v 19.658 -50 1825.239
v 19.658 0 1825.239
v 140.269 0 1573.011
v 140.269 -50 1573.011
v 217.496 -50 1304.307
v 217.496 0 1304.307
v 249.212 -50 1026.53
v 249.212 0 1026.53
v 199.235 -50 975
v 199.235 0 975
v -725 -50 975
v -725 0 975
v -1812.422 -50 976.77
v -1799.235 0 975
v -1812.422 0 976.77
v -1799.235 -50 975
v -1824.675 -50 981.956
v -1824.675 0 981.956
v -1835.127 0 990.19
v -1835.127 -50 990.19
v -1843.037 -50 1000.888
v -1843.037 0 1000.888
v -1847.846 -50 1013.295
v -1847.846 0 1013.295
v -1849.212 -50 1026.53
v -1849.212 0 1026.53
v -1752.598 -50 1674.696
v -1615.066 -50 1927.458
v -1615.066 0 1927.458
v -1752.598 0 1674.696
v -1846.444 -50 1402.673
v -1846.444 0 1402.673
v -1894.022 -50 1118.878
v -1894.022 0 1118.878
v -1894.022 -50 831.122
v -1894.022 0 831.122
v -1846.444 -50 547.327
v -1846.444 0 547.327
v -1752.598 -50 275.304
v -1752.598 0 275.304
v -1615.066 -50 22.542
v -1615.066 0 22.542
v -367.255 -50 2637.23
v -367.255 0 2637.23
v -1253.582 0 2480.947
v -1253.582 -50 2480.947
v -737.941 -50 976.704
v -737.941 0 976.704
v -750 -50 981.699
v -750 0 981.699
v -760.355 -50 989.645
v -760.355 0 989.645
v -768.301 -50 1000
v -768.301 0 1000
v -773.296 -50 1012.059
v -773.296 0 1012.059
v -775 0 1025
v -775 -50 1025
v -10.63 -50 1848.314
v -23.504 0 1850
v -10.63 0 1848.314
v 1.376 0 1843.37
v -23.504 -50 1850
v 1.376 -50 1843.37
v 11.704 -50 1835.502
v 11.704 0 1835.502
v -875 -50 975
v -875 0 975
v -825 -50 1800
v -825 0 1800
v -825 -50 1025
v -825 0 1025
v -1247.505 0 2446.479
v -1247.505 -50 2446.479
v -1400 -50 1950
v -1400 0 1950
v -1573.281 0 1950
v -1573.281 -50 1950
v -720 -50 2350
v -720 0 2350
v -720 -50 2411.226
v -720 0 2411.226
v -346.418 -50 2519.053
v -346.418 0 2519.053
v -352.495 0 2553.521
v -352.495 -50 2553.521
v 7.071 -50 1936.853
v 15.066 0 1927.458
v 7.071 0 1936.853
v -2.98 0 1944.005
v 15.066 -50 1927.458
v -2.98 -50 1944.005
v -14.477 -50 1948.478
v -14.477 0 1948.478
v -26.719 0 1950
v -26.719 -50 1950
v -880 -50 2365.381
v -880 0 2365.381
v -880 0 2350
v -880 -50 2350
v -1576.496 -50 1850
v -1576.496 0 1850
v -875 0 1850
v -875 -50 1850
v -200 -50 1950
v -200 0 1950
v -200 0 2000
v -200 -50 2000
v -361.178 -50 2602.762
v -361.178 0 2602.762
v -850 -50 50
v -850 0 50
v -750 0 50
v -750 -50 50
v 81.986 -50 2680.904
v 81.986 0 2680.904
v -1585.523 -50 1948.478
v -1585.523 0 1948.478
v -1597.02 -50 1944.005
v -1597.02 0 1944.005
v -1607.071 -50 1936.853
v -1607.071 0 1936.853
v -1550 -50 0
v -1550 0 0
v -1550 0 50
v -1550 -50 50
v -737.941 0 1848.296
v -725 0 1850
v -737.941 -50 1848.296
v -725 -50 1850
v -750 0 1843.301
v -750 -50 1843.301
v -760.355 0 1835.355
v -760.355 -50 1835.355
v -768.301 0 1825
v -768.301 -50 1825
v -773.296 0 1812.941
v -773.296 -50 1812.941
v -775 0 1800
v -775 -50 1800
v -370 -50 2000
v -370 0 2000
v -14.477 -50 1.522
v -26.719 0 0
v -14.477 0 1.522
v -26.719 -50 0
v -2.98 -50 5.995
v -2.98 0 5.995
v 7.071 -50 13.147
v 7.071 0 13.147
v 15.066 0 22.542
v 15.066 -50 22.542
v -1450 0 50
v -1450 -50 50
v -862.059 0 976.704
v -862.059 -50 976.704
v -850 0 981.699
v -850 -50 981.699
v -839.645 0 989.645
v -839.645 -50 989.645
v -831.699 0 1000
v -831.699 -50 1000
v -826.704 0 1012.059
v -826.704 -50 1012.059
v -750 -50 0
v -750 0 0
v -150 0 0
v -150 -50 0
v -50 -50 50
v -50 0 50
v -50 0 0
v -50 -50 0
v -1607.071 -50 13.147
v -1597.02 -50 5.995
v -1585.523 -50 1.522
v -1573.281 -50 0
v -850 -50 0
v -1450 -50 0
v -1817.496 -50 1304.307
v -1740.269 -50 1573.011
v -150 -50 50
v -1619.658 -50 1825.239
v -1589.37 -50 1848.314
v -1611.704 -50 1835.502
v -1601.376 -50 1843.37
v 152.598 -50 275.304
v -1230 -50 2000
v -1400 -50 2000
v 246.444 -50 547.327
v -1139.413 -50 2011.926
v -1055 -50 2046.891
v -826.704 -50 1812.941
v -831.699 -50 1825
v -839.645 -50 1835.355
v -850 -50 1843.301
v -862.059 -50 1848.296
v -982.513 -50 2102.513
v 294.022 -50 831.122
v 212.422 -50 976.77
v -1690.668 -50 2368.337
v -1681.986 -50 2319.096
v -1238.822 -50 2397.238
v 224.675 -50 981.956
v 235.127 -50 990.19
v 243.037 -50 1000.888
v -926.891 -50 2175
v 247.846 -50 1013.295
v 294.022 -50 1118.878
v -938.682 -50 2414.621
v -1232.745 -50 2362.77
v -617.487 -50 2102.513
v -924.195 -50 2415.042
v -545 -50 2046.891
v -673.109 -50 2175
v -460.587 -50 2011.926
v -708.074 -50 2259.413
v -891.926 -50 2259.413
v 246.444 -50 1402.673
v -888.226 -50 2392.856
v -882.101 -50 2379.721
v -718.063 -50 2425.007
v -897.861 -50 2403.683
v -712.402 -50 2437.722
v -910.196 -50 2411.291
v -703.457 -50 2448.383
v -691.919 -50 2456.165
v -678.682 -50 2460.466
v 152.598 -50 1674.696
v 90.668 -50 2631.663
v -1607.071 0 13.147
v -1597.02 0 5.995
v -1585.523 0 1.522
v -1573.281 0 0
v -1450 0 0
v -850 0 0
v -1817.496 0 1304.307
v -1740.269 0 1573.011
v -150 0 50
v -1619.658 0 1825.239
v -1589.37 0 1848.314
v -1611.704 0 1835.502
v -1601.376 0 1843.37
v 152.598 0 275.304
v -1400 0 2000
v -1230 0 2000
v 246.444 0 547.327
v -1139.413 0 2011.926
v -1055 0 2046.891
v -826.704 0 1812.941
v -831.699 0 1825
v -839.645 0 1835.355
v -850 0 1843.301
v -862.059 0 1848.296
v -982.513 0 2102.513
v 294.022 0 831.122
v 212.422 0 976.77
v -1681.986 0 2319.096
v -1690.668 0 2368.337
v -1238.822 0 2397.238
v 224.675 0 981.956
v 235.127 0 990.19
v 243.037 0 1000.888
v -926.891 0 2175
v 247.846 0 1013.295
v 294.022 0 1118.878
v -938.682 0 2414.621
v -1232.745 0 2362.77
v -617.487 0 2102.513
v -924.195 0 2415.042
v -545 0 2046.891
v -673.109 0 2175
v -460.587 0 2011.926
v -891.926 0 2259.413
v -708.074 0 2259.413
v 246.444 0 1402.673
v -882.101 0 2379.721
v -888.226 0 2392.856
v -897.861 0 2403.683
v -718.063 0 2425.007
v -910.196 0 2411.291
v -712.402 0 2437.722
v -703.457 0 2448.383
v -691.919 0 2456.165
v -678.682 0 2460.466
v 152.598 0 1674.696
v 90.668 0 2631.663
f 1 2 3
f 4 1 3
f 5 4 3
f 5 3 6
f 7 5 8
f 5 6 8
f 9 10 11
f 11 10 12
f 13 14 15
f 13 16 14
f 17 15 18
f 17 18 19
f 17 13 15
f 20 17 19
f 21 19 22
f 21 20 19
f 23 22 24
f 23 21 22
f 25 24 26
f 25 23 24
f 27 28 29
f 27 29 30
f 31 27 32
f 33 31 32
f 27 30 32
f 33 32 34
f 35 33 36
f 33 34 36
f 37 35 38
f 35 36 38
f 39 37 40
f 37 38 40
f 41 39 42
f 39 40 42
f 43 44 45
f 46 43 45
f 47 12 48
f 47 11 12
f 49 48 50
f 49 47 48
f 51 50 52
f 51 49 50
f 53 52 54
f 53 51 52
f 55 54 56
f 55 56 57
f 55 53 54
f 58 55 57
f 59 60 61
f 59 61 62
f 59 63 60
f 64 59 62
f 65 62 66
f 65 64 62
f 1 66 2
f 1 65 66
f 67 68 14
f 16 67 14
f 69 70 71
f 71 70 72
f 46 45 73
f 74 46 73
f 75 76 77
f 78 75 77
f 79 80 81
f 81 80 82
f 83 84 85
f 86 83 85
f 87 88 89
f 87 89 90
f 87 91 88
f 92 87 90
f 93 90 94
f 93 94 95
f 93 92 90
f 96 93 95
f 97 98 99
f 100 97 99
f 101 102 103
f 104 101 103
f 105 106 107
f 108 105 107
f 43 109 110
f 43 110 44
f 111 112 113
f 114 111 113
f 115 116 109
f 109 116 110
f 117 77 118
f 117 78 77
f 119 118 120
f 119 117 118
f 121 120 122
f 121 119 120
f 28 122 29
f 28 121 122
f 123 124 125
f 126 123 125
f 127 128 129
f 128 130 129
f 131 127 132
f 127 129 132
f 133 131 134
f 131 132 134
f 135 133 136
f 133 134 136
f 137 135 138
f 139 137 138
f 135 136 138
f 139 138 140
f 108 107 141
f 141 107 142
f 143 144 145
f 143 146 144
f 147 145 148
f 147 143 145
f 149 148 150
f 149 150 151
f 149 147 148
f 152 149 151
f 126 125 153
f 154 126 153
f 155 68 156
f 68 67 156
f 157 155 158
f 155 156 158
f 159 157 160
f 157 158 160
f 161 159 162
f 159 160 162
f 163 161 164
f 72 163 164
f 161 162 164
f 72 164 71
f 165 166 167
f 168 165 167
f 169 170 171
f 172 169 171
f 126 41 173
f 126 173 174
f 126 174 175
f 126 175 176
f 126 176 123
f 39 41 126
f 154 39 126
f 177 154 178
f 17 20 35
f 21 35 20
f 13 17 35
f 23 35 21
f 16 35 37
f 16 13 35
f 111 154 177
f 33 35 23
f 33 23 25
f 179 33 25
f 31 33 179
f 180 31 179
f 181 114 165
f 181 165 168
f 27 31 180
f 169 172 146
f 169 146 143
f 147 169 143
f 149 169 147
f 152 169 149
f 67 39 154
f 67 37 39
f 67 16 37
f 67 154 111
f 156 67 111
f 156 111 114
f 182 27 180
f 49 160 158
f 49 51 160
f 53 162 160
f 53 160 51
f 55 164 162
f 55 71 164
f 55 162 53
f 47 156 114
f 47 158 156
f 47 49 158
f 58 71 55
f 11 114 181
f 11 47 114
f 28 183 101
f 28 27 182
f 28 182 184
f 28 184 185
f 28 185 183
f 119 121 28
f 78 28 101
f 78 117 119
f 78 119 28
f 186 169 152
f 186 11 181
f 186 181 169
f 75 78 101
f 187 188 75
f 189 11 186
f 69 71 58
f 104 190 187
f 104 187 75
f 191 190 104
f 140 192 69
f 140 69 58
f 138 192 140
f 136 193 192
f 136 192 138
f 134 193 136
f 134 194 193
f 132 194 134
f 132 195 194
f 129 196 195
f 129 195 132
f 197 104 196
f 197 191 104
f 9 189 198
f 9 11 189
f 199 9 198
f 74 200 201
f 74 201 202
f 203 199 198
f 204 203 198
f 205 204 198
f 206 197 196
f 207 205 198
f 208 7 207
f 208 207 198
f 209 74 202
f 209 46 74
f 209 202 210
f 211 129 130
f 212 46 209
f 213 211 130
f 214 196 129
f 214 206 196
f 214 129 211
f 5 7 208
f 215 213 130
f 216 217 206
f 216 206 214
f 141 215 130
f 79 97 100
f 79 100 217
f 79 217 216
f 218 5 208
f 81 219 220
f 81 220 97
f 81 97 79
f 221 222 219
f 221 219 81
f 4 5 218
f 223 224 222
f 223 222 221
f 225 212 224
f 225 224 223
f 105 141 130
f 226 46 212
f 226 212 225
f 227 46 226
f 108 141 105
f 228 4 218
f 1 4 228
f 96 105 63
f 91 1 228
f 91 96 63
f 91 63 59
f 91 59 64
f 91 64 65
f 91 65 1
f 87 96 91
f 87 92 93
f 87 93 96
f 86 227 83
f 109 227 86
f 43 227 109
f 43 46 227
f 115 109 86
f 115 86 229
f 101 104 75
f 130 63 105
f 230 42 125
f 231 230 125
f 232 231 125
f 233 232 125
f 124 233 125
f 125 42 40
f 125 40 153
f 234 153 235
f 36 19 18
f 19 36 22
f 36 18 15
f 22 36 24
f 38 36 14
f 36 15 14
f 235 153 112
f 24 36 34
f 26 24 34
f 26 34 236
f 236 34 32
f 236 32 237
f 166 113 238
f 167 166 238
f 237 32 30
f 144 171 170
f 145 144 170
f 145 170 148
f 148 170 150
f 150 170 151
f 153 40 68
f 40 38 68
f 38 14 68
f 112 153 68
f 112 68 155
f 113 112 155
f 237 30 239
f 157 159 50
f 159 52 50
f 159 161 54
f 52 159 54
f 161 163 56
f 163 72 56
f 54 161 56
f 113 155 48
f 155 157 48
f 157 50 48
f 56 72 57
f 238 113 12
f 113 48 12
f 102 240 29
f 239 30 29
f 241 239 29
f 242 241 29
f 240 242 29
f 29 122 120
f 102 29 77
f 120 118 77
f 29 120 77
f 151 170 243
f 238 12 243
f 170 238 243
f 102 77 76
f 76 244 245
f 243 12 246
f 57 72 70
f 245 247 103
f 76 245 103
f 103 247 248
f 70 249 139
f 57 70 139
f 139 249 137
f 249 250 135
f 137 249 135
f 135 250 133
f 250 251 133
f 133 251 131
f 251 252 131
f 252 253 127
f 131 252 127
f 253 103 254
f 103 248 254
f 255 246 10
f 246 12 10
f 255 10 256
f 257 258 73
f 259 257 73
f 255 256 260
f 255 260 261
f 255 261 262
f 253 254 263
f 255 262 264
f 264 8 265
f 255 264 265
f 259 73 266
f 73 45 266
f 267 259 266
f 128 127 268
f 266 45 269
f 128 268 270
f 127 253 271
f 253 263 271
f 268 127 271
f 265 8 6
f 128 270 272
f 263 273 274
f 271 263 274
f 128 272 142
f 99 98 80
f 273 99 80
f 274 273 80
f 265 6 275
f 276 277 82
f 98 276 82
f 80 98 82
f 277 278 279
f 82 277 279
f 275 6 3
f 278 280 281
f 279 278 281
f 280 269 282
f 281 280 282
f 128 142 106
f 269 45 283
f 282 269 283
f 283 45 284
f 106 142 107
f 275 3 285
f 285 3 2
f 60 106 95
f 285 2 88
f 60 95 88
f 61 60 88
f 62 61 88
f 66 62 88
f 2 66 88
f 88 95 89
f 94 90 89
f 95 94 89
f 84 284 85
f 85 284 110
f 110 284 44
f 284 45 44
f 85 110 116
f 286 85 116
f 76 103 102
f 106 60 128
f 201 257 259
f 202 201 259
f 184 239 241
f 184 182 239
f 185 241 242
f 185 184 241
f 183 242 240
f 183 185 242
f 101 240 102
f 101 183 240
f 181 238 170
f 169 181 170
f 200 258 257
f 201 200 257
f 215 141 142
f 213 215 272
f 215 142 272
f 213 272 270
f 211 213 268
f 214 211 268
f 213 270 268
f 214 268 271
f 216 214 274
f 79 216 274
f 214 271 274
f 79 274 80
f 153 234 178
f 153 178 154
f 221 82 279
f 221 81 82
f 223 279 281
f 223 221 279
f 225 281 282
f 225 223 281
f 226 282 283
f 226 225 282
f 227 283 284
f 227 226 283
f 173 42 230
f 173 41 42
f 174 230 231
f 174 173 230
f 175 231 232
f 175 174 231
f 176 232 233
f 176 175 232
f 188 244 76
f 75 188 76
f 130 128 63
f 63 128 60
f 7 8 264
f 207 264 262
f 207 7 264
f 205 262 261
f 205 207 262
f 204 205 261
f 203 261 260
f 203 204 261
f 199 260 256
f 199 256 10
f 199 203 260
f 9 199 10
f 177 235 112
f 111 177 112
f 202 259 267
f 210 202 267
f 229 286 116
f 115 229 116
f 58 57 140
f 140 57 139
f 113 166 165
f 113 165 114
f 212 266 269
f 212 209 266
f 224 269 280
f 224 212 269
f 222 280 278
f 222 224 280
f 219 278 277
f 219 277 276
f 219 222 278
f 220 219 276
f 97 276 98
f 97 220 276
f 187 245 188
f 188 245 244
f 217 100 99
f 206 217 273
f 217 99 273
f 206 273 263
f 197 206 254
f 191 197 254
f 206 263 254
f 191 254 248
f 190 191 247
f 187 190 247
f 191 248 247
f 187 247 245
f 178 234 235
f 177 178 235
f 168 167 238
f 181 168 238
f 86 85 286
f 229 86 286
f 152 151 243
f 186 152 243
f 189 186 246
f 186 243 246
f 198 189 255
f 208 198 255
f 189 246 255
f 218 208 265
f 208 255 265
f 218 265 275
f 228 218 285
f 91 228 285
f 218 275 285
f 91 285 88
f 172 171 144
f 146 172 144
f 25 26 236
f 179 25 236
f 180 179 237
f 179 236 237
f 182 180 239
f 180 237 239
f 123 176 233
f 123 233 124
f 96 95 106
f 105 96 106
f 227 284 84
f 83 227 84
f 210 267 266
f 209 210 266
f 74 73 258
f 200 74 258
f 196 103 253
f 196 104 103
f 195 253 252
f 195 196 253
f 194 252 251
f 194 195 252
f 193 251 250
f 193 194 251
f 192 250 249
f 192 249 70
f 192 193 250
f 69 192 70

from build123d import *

# Parameters (mm, degrees)
F0_W     = 600
F0_H     = 50
F0_W_2   = 25
F0_H_2   = 875
F0_W_3   = 775
F1_DEPTH = 50
F2_R     = 50


with BuildPart() as f1:
    # F0 (on Front) → F1 (new body)
    with BuildSketch(Plane.XZ):
        with Locations((-1150, 25)):
            Rectangle(F0_W, F0_H)
        with Locations((-450, 25)):
            Rectangle(F0_W, F0_H)
        with BuildLine():
            Line((-825, 925), (-1600, 925))
            Line((-1600, 925), (-1600, 92.0008493776))
            ThreePointArc((-1600.0000000001, 92.0008493776), (-1586.7954423389, 70.9017119543), (-1573.2805475772, 50))
            Line((-1573.2805475772, 50), (-1550, 50))
            Line((-1550, 50), (-1450, 50))
            Line((-1450, 50), (-850, 50))
            Line((-850, 50), (-800, 50))
            Line((-800, 50), (-750, 50))
            Line((-750, 50), (-150, 50))
            Line((-150, 50), (-50, 50))
            Line((-50, 50), (-26.7194524228, 50))
            ThreePointArc((-26.7194524228, 50), (-13.2045576611, 70.9017119543), (1e-10, 92.0008493776))
            Line((0, 92.0008493776), (0, 925))
            Line((0, 925), (-775, 925))
            Line((-775, 925), (-825, 925))
        make_face()
        with BuildLine():
            Line((-1849.2577214167, 925), (-1899.279129469, 925))
            ThreePointArc((-1899.279129469, 925), (-1815.7790507756, 441.1008996693), (-1600, 0))
            Line((-1600, 0), (-1600, 92.0008493776))
            ThreePointArc((-1600.0000000001, 92.0008493776), (-1779.3055551094, 492.139557753), (-1849.2577214167, 925))
        make_face()
        Polygon((-1400, 1950), (-1600, 1950), (-1600, 1850), (-825, 1850), (-800, 1850), (-800, 1950), align=None)
        Polygon((-200, 1950), (-800, 1950), (-800, 1850), (-775, 1850), (0, 1850), (0, 1950), align=None)
        with BuildLine():
            ThreePointArc((0, 0), (215.7790507756, 441.1008996693), (299.279129469, 925))
            Line((299.279129469, 925), (249.2577214167, 925))
            ThreePointArc((249.2577214167, 925), (179.3055551094, 492.139557753), (1e-10, 92.0008493776))
            Line((0, 92.0008493776), (0, 0))
        make_face()
        with BuildLine():
            Line((-1400, 2000), (-1400, 1950))
            Line((-1400, 1950), (-800, 1950))
            Line((-800, 1950), (-200, 1950))
            Line((-200, 1950), (-200, 2000))
            Line((-200, 2000), (-370, 2000))
            ThreePointArc((-370, 2000), (-617.4873734153, 2102.5126265847), (-720, 2350))
            Line((-720, 2350), (-720, 2453.1805617435))
            Line((-720, 2453.1805617435), (-880, 2424.9682448302))
            Line((-880, 2424.9682448302), (-880, 2350))
            ThreePointArc((-880, 2350), (-982.5126265847, 2102.5126265847), (-1230, 2000))
            Line((-1230, 2000), (-1400, 2000))
        make_face()
        with Locations((-812.5, 1412.5)):
            Rectangle(F0_W_2, F0_H_2)
        with Locations((-787.5, 1412.5)):
            Rectangle(F0_W_2, F0_H_2)
        with BuildLine():
            Line((-1185.1073630845, 2406.7095161216), (-880, 2460.5081762462))
            Line((-880, 2460.5081762462), (-880, 2485.8938415433))
            Line((-880, 2485.8938415433), (-1184.0750236748, 2432.2772107099))
            ThreePointArc((-1184.0750236748, 2432.2772107099), (-1183.39180697, 2427.0876646147), (-1183.1634888555, 2421.8583200499))
            ThreePointArc((-1183.1634888555, 2421.8583200499), (-1183.6514415614, 2414.2218138547), (-1185.1073630845, 2406.7095161216))
        make_face()
        with BuildLine():
            Line((-1243.1634888555, 2421.8583200499), (-1184.0750236748, 2432.2772107099))
            ThreePointArc((-1184.0750236748, 2432.2772107099), (-1187.6557386402, 2444.6374698592), (-1193.7897719678, 2455.9499037722))
            Line((-1193.7897719678, 2455.9499037722), (-1247.5046932972, 2446.4785138752))
            Line((-1247.5046932972, 2446.4785138752), (-1243.1634888555, 2421.8583200499))
        make_face()
        with BuildLine():
            Line((-1184.0750236748, 2432.2772107099), (-880, 2485.8938415433))
            Line((-880, 2485.8938415433), (-880, 2500))
            Line((-880, 2500), (-800, 2500))
            Line((-800, 2500), (-804.3412044417, 2524.6201938253))
            Line((-804.3412044417, 2524.6201938253), (-1193.7897719678, 2455.9499037722))
            ThreePointArc((-1193.7897719678, 2455.9499037722), (-1187.6557386402, 2444.6374698592), (-1184.0750236748, 2432.2772107099))
        make_face()
        with BuildLine():
            Line((-1232.7445981955, 2362.7698548691), (-880, 2424.9682448302))
            Line((-880, 2424.9682448302), (-880, 2460.5081762462))
            Line((-880, 2460.5081762462), (-1185.1073630845, 2406.7095161216))
            ThreePointArc((-1185.1073630845, 2406.7095161216), (-1202.4832672908, 2377.7548102865), (-1232.7445981955, 2362.7698548691))
        make_face()
        Polygon((-880, 2485.8938415433), (-880, 2460.5081762462), (-720, 2488.7204931595), (-720, 2500), (-800, 2500), align=None)
        with BuildLine():
            ThreePointArc((-414.8926369155, 2593.2904838784), (-416.7876625009, 2580.5623102494), (-415.9249763252, 2567.7227892901))
            Line((-415.9249763252, 2567.7227892901), (-356.8365111445, 2578.1416799501))
            Line((-356.8365111445, 2578.1416799501), (-361.1777155862, 2602.7618737754))
            Line((-361.1777155862, 2602.7618737754), (-414.8926369155, 2593.2904838784))
        make_face()
        with BuildLine():
            Line((-720, 2500), (-720, 2488.7204931595))
            Line((-720, 2488.7204931595), (-406.2102280322, 2544.0500962278))
            ThreePointArc((-406.2102280322, 2544.0500962278), (-412.3442613598, 2555.3625301408), (-415.9249763252, 2567.7227892901))
            Line((-415.9249763252, 2567.7227892901), (-800, 2500))
            Line((-800, 2500), (-720, 2500))
        make_face()
        Polygon((-880, 2500), (-880, 2485.8938415433), (-800, 2500), align=None)
        with BuildLine():
            Line((-810.41889066, 2559.0884651807), (-804.3412044417, 2524.6201938253))
            Line((-804.3412044417, 2524.6201938253), (-414.8926369155, 2593.2904838784))
            ThreePointArc((-414.8926369155, 2593.2904838784), (-397.5167327092, 2622.2451897135), (-367.2554018045, 2637.2301451309))
            Line((-367.2554018045, 2637.2301451309), (-810.41889066, 2559.0884651807))
        make_face()
        with BuildLine():
            Line((-804.3412044417, 2524.6201938253), (-800, 2500))
            Line((-800, 2500), (-415.9249763252, 2567.7227892901))
            ThreePointArc((-415.9249763252, 2567.7227892901), (-416.7876625009, 2580.5623102494), (-414.8926369155, 2593.2904838784))
            Line((-414.8926369155, 2593.2904838784), (-804.3412044417, 2524.6201938253))
        make_face()
        with BuildLine():
            ThreePointArc((-1253.5823795155, 2480.9467852306), (-1220.0208735696, 2477.2155179354), (-1193.7897719678, 2455.9499037722))
            Line((-1193.7897719678, 2455.9499037722), (-804.3412044417, 2524.6201938253))
            Line((-804.3412044417, 2524.6201938253), (-810.41889066, 2559.0884651807))
            Line((-810.41889066, 2559.0884651807), (-1253.5823795155, 2480.9467852306))
        make_face()
        with BuildLine():
            Line((-720, 2488.7204931595), (-720, 2453.1805617435))
            Line((-720, 2453.1805617435), (-346.4176204845, 2519.0532147694))
            ThreePointArc((-346.4176204845, 2519.0532147694), (-379.9791264304, 2522.7844820646), (-406.2102280322, 2544.0500962278))
            Line((-406.2102280322, 2544.0500962278), (-720, 2488.7204931595))
        make_face()
        Polygon((-880, 2460.5081762462), (-880, 2424.9682448302), (-720, 2453.1805617435), (-720, 2488.7204931595), align=None)
        with BuildLine():
            Line((-1238.8222844138, 2397.2381262246), (-1185.1073630845, 2406.7095161216))
            ThreePointArc((-1185.1073630845, 2406.7095161216), (-1183.6514415614, 2414.2218138547), (-1183.1634888555, 2421.8583200499))
            ThreePointArc((-1183.1634888555, 2421.8583200499), (-1183.39180697, 2427.0876646147), (-1184.0750236748, 2432.2772107099))
            Line((-1184.0750236748, 2432.2772107099), (-1243.1634888555, 2421.8583200499))
            Line((-1243.1634888555, 2421.8583200499), (-1238.8222844138, 2397.2381262246))
        make_face()
        with BuildLine():
            ThreePointArc((-415.9249763252, 2567.7227892901), (-412.3442613598, 2555.3625301408), (-406.2102280322, 2544.0500962278))
            Line((-406.2102280322, 2544.0500962278), (-352.4953067028, 2553.5214861248))
            Line((-352.4953067028, 2553.5214861248), (-356.8365111445, 2578.1416799501))
            Line((-356.8365111445, 2578.1416799501), (-415.9249763252, 2567.7227892901))
        make_face()
        with BuildLine():
            Line((-1681.9857732693, 2319.0964462745), (-1292.5372057432, 2387.7667363276))
            ThreePointArc((-1292.5372057432, 2387.7667363276), (-1302.2519540362, 2411.4394293899), (-1301.2196146265, 2437.0071239782))
            Line((-1301.2196146265, 2437.0071239782), (-1690.6681821527, 2368.3368339251))
            Line((-1690.6681821527, 2368.3368339251), (-1681.9857732693, 2319.0964462745))
        make_face()
        with BuildLine():
            Line((-1247.5046932972, 2446.4785138752), (-1193.7897719678, 2455.9499037722))
            ThreePointArc((-1193.7897719678, 2455.9499037722), (-1220.0208735696, 2477.2155179354), (-1253.5823795155, 2480.9467852306))
            Line((-1253.5823795155, 2480.9467852306), (-1247.5046932972, 2446.4785138752))
        make_face()
        with BuildLine():
            ThreePointArc((-406.2102280322, 2544.0500962278), (-379.9791264304, 2522.7844820646), (-346.4176204845, 2519.0532147694))
            Line((-346.4176204845, 2519.0532147694), (-352.4953067028, 2553.5214861248))
            Line((-352.4953067028, 2553.5214861248), (-406.2102280322, 2544.0500962278))
        make_face()
        with BuildLine():
            ThreePointArc((-296.8365111445, 2578.1416799501), (-297.3244638504, 2570.5051737549), (-298.7803853735, 2562.9928760218))
            Line((-298.7803853735, 2562.9928760218), (90.6681821527, 2631.6631660749))
            Line((90.6681821527, 2631.6631660749), (81.9857732693, 2680.9035537255))
            Line((81.9857732693, 2680.9035537255), (-307.4627942568, 2612.2332636724))
            ThreePointArc((-307.4627942568, 2612.2332636724), (-299.5546509562, 2595.9963290189), (-296.8365111445, 2578.1416799501))
        make_face()
        with BuildLine():
            ThreePointArc((-1301.2196146265, 2437.0071239782), (-1302.2519540362, 2411.4394293899), (-1292.5372057432, 2387.7667363276))
            Line((-1292.5372057432, 2387.7667363276), (-1238.8222844138, 2397.2381262246))
            Line((-1238.8222844138, 2397.2381262246), (-1243.1634888555, 2421.8583200499))
            Line((-1243.1634888555, 2421.8583200499), (-1247.5046932972, 2446.4785138752))
            Line((-1247.5046932972, 2446.4785138752), (-1301.2196146265, 2437.0071239782))
        make_face()
        with BuildLine():
            Line((-352.4953067028, 2553.5214861248), (-298.7803853735, 2562.9928760218))
            ThreePointArc((-298.7803853735, 2562.9928760218), (-297.3244638504, 2570.5051737549), (-296.8365111445, 2578.1416799501))
            ThreePointArc((-296.8365111445, 2578.1416799501), (-299.5546509562, 2595.9963290189), (-307.4627942568, 2612.2332636724))
            Line((-307.4627942568, 2612.2332636724), (-361.1777155862, 2602.7618737754))
            Line((-361.1777155862, 2602.7618737754), (-356.8365111445, 2578.1416799501))
            Line((-356.8365111445, 2578.1416799501), (-352.4953067028, 2553.5214861248))
        make_face()
        with BuildLine():
            ThreePointArc((-367.2554018045, 2637.2301451309), (-397.5167327092, 2622.2451897135), (-414.8926369155, 2593.2904838784))
            Line((-414.8926369155, 2593.2904838784), (-361.1777155862, 2602.7618737754))
            Line((-361.1777155862, 2602.7618737754), (-367.2554018045, 2637.2301451309))
        make_face()
        with BuildLine():
            Line((-1238.8222844138, 2397.2381262246), (-1232.7445981955, 2362.7698548691))
            ThreePointArc((-1232.7445981955, 2362.7698548691), (-1202.4832672908, 2377.7548102865), (-1185.1073630845, 2406.7095161216))
            Line((-1185.1073630845, 2406.7095161216), (-1238.8222844138, 2397.2381262246))
        make_face()
        with BuildLine():
            Line((-1600, 925), (-1849.2577214167, 925))
            ThreePointArc((-1849.2577214167, 925), (-1779.3055551094, 492.139557753), (-1600.0000000001, 92.0008493776))
            Line((-1600, 92.0008493776), (-1600, 925))
        make_face()
        with BuildLine():
            ThreePointArc((1e-10, 92.0008493776), (179.3055551094, 492.139557753), (249.2577214167, 925))
            Line((249.2577214167, 925), (0, 925))
            Line((0, 925), (0, 92.0008493776))
        make_face()
        with BuildLine():
            ThreePointArc((299.279129469, 925), (230.4848713679, 1461.1051834057), (0, 1950))
            Line((0, 1950), (0, 1850))
            Line((0, 1850), (4.8936130896, 1850))
            ThreePointArc((4.8936130896, 1850), (187.5663076307, 1429.340769936), (250, 975))
            ThreePointArc((250, 975), (249.8144201308, 949.9972452643), (249.2577214167, 925))
            Line((249.2577214167, 925), (299.279129469, 925))
        make_face()
        with BuildLine():
            Line((-1600, 1850), (-1600, 1950))
            ThreePointArc((-1600, 1950), (-1830.4848713679, 1461.1051834057), (-1899.279129469, 925))
            Line((-1899.279129469, 925), (-1849.2577214167, 925))
            ThreePointArc((-1849.2577214167, 925), (-1849.8144201308, 949.9972452643), (-1850, 975))
            ThreePointArc((-1850, 975), (-1787.5663076307, 1429.340769936), (-1604.8936130896, 1850))
            Line((-1604.8936130896, 1850), (-1600, 1850))
        make_face()
        Polygon((-800, 975), (-825, 975), (-825, 925), (-775, 925), (-775, 975), align=None)
        with BuildLine():
            Line((-50, 0), (0, 0))
            Line((0, 0), (0, 92.0008493776))
            ThreePointArc((1e-10, 92.0008493776), (-13.2045576611, 70.9017119543), (-26.7194524228, 50))
            Line((-26.7194524228, 50), (-50, 50))
            Line((-50, 50), (-50, 0))
        make_face()
        with BuildLine():
            Line((-1600, 92.0008493776), (-1600, 0))
            Line((-1600, 0), (-1550, 0))
            Line((-1550, 0), (-1550, 50))
            Line((-1550, 50), (-1573.2805475772, 50))
            ThreePointArc((-1573.2805475772, 50), (-1586.7954423389, 70.9017119543), (-1600.0000000001, 92.0008493776))
        make_face()
        with Locations((-1212.5, 950)):
            Rectangle(F0_W_3, F0_H)
        with Locations((-387.5, 950)):
            Rectangle(F0_W_3, F0_H)
        with BuildLine():
            Line((-1600, 925), (-1600, 975))
            Line((-1600, 975), (-1850, 975))
            ThreePointArc((-1850, 975), (-1849.8144201308, 949.9972452643), (-1849.2577214167, 925))
            Line((-1849.2577214167, 925), (-1600, 925))
        make_face()
        with BuildLine():
            Line((250, 975), (0, 975))
            Line((0, 975), (0, 925))
            Line((0, 925), (249.2577214167, 925))
            ThreePointArc((249.2577214167, 925), (249.8144201308, 949.9972452643), (250, 975))
        make_face()
    extrude(amount=F1_DEPTH)

    # F2
    f2_edges = [f1.edges().sort_by_distance(p)[0] for p in [
        (-1604.893613, -25, 1850),
        (-825, -25, 1850),
        (-1850, -25, 975),
        (-825, -25, 975),
        (-775, -25, 1850),
        (-775, -25, 975),
        (250, -25, 975),
        (4.893613, -25, 1850),
        (0, -25, 1950),
        (-1600, -25, 1950),
        (-1600, -25, 0),
        (0, -25, 0),
        (-880, -25, 2424.968245),
        (-720, -25, 2453.180562),
    ]]
    fillet(f2_edges, radius=F2_R)


solid = f1.part
